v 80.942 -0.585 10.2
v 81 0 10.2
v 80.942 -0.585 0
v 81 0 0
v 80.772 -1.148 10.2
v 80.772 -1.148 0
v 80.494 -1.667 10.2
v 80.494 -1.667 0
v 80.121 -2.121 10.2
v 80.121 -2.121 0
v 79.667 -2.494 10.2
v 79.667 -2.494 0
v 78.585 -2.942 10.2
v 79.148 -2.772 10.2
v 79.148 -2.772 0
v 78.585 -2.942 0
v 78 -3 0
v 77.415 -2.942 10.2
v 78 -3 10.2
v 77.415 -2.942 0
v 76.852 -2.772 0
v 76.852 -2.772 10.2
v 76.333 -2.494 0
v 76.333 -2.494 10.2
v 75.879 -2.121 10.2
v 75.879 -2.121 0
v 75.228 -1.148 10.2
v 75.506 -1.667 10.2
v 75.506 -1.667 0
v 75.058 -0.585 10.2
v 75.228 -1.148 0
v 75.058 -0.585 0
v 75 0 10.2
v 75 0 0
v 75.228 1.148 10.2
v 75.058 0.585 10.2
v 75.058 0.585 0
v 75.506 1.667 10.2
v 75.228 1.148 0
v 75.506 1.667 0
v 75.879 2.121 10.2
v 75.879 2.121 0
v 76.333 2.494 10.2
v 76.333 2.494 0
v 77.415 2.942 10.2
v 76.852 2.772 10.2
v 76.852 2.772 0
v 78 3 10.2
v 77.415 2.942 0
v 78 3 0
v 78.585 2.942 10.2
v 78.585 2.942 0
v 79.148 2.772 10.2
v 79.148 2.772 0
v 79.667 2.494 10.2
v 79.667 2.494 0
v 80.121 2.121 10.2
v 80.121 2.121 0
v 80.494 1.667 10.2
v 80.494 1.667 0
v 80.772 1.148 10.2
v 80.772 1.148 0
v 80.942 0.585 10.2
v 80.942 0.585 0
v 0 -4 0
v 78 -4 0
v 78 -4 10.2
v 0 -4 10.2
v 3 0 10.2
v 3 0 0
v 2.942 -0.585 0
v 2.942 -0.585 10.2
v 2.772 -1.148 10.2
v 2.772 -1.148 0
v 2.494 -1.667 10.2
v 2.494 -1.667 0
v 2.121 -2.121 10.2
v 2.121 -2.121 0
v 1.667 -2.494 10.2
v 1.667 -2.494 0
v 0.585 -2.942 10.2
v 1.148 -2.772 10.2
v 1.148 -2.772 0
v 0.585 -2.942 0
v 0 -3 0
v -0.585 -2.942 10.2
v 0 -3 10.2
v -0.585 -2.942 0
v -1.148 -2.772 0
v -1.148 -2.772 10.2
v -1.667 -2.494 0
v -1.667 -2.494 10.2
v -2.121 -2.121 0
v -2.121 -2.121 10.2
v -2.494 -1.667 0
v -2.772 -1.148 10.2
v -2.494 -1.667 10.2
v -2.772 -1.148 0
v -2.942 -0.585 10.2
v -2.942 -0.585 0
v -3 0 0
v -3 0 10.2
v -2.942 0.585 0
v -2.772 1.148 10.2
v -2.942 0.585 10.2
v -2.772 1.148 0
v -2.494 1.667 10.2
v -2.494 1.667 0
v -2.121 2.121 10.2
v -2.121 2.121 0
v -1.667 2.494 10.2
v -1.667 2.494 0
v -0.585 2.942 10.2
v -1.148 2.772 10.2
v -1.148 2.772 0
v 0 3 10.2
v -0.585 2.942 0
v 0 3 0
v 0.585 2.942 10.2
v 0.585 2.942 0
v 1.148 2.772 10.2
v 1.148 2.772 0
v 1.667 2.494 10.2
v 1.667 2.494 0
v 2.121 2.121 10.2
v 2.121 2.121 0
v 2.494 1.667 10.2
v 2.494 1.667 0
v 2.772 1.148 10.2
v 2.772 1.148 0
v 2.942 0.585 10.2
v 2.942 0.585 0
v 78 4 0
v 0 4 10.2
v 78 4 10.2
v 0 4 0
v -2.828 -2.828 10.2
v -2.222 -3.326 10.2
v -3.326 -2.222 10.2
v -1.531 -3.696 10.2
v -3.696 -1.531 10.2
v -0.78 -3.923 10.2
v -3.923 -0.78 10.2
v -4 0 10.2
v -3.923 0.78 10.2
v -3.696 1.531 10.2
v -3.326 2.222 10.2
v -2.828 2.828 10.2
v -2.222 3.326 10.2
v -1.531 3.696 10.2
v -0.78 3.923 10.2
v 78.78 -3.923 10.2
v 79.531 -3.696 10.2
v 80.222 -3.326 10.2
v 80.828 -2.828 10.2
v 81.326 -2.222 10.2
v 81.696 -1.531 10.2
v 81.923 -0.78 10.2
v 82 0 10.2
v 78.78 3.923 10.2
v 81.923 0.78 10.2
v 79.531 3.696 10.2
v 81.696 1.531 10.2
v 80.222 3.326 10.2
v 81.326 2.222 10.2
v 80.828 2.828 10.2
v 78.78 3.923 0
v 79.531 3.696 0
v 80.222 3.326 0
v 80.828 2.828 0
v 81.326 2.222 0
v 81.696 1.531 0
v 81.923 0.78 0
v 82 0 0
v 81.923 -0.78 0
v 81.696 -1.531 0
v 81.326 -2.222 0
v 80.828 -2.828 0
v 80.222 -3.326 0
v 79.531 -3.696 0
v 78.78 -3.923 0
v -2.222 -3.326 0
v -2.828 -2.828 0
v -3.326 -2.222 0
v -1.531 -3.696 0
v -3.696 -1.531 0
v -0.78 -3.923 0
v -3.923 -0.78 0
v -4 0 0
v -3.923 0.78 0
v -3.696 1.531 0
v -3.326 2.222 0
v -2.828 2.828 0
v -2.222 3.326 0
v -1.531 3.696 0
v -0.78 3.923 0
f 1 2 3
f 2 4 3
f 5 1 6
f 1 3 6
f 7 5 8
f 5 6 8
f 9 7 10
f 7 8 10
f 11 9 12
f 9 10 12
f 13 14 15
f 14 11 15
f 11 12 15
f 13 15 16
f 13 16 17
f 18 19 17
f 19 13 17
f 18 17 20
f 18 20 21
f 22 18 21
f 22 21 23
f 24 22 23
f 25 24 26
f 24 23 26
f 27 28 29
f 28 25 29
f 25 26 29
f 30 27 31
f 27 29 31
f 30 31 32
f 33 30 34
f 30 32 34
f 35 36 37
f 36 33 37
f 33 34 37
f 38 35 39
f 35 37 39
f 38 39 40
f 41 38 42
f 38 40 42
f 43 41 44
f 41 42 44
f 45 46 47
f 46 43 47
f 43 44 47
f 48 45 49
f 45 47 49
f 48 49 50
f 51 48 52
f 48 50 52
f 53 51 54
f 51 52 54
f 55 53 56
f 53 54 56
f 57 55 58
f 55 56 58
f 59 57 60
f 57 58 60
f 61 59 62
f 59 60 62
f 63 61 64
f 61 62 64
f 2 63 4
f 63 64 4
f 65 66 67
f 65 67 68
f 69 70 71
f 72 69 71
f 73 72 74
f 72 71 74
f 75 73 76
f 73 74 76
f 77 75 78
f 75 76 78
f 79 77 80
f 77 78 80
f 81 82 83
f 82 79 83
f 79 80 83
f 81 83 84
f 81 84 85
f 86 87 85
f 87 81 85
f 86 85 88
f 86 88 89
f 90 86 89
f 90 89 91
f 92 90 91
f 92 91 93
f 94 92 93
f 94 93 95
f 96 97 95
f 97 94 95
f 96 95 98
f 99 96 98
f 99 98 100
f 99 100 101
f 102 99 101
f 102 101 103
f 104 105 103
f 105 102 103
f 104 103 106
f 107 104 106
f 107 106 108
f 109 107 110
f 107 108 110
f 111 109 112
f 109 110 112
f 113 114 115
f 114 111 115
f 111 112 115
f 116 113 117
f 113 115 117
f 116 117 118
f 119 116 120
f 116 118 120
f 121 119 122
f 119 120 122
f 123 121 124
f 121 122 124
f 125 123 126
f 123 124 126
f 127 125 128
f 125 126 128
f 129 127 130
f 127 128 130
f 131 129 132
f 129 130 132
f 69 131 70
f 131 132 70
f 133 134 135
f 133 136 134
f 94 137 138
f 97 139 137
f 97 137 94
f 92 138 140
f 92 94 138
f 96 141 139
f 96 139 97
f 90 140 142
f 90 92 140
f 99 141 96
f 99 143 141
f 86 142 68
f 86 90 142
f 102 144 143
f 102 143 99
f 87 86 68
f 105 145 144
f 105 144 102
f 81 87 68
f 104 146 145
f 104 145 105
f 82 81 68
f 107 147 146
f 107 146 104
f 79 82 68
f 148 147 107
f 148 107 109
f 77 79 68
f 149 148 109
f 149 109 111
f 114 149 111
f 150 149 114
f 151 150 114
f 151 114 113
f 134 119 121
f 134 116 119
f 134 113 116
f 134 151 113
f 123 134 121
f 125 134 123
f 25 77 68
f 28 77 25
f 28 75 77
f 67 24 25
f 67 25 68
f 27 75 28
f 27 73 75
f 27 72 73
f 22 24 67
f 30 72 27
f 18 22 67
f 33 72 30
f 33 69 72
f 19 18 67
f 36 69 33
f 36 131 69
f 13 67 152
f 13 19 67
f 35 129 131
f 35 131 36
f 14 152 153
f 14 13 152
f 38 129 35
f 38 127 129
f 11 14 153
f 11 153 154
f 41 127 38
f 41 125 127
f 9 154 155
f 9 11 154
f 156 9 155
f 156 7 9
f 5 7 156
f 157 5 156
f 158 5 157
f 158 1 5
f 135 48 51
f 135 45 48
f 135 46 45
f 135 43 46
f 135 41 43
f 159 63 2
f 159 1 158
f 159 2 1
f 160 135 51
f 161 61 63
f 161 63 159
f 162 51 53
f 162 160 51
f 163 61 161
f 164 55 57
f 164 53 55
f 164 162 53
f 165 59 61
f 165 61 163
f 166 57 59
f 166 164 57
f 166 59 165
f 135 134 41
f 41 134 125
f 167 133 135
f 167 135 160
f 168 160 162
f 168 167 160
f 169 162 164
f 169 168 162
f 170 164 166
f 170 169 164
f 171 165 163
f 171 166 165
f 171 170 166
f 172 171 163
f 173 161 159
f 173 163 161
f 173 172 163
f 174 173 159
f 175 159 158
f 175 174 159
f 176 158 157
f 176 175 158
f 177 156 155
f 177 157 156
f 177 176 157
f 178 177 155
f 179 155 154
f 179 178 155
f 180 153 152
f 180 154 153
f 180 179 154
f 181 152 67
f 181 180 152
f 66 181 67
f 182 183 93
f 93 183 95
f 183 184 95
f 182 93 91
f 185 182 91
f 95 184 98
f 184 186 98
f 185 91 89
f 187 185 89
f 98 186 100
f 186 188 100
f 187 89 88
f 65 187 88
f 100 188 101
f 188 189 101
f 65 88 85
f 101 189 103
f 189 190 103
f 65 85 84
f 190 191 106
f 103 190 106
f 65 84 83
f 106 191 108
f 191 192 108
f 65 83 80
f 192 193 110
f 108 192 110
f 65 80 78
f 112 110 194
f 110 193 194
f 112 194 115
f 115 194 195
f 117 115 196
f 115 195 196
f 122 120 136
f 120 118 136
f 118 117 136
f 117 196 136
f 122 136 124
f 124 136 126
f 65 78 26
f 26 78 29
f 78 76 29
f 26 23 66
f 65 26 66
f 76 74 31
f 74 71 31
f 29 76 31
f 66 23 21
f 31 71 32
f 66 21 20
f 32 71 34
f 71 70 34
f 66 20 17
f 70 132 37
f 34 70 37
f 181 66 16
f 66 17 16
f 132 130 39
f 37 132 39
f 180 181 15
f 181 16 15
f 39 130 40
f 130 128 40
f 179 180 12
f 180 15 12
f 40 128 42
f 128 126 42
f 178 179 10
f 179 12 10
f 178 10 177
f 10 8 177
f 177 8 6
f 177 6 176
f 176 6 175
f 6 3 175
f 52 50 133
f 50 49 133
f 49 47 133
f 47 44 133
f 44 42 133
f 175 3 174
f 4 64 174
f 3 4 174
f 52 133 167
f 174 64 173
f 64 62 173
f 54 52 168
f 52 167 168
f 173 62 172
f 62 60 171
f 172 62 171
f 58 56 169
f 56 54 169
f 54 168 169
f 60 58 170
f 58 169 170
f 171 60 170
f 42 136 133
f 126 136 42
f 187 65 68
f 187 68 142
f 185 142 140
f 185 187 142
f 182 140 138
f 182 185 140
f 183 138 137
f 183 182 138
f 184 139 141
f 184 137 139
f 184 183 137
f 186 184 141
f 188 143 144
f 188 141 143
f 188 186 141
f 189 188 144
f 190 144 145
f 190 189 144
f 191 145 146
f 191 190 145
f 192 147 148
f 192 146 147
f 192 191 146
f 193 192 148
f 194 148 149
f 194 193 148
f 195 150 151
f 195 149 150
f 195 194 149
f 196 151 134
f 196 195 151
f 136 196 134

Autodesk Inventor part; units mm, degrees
ref_plane "YZ Plane" through (0, 0, 0) normal (1, 0, 0) x (0, 1, 0)
ref_plane "XZ Plane" through (0, 0, 0) normal (0, 1, 0) x (-1, 0, 0)
ref_plane "XY Plane" through (0, 0, 0) normal (0, 0, 1) x (1, 0, 0)
sketch "Sketch1" plane through (0, 0, 0) normal (0, 0, 1) x (1, 0, 0)
  point P0 (0, 0)
sketch "Sketch2" plane through (0, 0, 0) normal (0, 0, 1) x (1, 0, 0)
  circle A0 centre (0, 0) radius 3
  circle A1 centre (78, 0) radius 3
  arc A2 (0, 4) -> (0, -4) centre (0, 0) ccw
  arc A3 (78, -4) -> (78, 4) centre (78, 0) ccw
  line L0 (0, 4) -> (78, 4)
  line L1 (78, -4) -> (0, -4)
  dimension "d0" = 6
  dimension "d1" = 6
  dimension "d2" = 78
  dimension "d3" = 8
  dimension "d4" = 8
extrude "Extrusion1" add sketch "Sketch2" along normal blind 10.2
properties part number "Connector to rod"
